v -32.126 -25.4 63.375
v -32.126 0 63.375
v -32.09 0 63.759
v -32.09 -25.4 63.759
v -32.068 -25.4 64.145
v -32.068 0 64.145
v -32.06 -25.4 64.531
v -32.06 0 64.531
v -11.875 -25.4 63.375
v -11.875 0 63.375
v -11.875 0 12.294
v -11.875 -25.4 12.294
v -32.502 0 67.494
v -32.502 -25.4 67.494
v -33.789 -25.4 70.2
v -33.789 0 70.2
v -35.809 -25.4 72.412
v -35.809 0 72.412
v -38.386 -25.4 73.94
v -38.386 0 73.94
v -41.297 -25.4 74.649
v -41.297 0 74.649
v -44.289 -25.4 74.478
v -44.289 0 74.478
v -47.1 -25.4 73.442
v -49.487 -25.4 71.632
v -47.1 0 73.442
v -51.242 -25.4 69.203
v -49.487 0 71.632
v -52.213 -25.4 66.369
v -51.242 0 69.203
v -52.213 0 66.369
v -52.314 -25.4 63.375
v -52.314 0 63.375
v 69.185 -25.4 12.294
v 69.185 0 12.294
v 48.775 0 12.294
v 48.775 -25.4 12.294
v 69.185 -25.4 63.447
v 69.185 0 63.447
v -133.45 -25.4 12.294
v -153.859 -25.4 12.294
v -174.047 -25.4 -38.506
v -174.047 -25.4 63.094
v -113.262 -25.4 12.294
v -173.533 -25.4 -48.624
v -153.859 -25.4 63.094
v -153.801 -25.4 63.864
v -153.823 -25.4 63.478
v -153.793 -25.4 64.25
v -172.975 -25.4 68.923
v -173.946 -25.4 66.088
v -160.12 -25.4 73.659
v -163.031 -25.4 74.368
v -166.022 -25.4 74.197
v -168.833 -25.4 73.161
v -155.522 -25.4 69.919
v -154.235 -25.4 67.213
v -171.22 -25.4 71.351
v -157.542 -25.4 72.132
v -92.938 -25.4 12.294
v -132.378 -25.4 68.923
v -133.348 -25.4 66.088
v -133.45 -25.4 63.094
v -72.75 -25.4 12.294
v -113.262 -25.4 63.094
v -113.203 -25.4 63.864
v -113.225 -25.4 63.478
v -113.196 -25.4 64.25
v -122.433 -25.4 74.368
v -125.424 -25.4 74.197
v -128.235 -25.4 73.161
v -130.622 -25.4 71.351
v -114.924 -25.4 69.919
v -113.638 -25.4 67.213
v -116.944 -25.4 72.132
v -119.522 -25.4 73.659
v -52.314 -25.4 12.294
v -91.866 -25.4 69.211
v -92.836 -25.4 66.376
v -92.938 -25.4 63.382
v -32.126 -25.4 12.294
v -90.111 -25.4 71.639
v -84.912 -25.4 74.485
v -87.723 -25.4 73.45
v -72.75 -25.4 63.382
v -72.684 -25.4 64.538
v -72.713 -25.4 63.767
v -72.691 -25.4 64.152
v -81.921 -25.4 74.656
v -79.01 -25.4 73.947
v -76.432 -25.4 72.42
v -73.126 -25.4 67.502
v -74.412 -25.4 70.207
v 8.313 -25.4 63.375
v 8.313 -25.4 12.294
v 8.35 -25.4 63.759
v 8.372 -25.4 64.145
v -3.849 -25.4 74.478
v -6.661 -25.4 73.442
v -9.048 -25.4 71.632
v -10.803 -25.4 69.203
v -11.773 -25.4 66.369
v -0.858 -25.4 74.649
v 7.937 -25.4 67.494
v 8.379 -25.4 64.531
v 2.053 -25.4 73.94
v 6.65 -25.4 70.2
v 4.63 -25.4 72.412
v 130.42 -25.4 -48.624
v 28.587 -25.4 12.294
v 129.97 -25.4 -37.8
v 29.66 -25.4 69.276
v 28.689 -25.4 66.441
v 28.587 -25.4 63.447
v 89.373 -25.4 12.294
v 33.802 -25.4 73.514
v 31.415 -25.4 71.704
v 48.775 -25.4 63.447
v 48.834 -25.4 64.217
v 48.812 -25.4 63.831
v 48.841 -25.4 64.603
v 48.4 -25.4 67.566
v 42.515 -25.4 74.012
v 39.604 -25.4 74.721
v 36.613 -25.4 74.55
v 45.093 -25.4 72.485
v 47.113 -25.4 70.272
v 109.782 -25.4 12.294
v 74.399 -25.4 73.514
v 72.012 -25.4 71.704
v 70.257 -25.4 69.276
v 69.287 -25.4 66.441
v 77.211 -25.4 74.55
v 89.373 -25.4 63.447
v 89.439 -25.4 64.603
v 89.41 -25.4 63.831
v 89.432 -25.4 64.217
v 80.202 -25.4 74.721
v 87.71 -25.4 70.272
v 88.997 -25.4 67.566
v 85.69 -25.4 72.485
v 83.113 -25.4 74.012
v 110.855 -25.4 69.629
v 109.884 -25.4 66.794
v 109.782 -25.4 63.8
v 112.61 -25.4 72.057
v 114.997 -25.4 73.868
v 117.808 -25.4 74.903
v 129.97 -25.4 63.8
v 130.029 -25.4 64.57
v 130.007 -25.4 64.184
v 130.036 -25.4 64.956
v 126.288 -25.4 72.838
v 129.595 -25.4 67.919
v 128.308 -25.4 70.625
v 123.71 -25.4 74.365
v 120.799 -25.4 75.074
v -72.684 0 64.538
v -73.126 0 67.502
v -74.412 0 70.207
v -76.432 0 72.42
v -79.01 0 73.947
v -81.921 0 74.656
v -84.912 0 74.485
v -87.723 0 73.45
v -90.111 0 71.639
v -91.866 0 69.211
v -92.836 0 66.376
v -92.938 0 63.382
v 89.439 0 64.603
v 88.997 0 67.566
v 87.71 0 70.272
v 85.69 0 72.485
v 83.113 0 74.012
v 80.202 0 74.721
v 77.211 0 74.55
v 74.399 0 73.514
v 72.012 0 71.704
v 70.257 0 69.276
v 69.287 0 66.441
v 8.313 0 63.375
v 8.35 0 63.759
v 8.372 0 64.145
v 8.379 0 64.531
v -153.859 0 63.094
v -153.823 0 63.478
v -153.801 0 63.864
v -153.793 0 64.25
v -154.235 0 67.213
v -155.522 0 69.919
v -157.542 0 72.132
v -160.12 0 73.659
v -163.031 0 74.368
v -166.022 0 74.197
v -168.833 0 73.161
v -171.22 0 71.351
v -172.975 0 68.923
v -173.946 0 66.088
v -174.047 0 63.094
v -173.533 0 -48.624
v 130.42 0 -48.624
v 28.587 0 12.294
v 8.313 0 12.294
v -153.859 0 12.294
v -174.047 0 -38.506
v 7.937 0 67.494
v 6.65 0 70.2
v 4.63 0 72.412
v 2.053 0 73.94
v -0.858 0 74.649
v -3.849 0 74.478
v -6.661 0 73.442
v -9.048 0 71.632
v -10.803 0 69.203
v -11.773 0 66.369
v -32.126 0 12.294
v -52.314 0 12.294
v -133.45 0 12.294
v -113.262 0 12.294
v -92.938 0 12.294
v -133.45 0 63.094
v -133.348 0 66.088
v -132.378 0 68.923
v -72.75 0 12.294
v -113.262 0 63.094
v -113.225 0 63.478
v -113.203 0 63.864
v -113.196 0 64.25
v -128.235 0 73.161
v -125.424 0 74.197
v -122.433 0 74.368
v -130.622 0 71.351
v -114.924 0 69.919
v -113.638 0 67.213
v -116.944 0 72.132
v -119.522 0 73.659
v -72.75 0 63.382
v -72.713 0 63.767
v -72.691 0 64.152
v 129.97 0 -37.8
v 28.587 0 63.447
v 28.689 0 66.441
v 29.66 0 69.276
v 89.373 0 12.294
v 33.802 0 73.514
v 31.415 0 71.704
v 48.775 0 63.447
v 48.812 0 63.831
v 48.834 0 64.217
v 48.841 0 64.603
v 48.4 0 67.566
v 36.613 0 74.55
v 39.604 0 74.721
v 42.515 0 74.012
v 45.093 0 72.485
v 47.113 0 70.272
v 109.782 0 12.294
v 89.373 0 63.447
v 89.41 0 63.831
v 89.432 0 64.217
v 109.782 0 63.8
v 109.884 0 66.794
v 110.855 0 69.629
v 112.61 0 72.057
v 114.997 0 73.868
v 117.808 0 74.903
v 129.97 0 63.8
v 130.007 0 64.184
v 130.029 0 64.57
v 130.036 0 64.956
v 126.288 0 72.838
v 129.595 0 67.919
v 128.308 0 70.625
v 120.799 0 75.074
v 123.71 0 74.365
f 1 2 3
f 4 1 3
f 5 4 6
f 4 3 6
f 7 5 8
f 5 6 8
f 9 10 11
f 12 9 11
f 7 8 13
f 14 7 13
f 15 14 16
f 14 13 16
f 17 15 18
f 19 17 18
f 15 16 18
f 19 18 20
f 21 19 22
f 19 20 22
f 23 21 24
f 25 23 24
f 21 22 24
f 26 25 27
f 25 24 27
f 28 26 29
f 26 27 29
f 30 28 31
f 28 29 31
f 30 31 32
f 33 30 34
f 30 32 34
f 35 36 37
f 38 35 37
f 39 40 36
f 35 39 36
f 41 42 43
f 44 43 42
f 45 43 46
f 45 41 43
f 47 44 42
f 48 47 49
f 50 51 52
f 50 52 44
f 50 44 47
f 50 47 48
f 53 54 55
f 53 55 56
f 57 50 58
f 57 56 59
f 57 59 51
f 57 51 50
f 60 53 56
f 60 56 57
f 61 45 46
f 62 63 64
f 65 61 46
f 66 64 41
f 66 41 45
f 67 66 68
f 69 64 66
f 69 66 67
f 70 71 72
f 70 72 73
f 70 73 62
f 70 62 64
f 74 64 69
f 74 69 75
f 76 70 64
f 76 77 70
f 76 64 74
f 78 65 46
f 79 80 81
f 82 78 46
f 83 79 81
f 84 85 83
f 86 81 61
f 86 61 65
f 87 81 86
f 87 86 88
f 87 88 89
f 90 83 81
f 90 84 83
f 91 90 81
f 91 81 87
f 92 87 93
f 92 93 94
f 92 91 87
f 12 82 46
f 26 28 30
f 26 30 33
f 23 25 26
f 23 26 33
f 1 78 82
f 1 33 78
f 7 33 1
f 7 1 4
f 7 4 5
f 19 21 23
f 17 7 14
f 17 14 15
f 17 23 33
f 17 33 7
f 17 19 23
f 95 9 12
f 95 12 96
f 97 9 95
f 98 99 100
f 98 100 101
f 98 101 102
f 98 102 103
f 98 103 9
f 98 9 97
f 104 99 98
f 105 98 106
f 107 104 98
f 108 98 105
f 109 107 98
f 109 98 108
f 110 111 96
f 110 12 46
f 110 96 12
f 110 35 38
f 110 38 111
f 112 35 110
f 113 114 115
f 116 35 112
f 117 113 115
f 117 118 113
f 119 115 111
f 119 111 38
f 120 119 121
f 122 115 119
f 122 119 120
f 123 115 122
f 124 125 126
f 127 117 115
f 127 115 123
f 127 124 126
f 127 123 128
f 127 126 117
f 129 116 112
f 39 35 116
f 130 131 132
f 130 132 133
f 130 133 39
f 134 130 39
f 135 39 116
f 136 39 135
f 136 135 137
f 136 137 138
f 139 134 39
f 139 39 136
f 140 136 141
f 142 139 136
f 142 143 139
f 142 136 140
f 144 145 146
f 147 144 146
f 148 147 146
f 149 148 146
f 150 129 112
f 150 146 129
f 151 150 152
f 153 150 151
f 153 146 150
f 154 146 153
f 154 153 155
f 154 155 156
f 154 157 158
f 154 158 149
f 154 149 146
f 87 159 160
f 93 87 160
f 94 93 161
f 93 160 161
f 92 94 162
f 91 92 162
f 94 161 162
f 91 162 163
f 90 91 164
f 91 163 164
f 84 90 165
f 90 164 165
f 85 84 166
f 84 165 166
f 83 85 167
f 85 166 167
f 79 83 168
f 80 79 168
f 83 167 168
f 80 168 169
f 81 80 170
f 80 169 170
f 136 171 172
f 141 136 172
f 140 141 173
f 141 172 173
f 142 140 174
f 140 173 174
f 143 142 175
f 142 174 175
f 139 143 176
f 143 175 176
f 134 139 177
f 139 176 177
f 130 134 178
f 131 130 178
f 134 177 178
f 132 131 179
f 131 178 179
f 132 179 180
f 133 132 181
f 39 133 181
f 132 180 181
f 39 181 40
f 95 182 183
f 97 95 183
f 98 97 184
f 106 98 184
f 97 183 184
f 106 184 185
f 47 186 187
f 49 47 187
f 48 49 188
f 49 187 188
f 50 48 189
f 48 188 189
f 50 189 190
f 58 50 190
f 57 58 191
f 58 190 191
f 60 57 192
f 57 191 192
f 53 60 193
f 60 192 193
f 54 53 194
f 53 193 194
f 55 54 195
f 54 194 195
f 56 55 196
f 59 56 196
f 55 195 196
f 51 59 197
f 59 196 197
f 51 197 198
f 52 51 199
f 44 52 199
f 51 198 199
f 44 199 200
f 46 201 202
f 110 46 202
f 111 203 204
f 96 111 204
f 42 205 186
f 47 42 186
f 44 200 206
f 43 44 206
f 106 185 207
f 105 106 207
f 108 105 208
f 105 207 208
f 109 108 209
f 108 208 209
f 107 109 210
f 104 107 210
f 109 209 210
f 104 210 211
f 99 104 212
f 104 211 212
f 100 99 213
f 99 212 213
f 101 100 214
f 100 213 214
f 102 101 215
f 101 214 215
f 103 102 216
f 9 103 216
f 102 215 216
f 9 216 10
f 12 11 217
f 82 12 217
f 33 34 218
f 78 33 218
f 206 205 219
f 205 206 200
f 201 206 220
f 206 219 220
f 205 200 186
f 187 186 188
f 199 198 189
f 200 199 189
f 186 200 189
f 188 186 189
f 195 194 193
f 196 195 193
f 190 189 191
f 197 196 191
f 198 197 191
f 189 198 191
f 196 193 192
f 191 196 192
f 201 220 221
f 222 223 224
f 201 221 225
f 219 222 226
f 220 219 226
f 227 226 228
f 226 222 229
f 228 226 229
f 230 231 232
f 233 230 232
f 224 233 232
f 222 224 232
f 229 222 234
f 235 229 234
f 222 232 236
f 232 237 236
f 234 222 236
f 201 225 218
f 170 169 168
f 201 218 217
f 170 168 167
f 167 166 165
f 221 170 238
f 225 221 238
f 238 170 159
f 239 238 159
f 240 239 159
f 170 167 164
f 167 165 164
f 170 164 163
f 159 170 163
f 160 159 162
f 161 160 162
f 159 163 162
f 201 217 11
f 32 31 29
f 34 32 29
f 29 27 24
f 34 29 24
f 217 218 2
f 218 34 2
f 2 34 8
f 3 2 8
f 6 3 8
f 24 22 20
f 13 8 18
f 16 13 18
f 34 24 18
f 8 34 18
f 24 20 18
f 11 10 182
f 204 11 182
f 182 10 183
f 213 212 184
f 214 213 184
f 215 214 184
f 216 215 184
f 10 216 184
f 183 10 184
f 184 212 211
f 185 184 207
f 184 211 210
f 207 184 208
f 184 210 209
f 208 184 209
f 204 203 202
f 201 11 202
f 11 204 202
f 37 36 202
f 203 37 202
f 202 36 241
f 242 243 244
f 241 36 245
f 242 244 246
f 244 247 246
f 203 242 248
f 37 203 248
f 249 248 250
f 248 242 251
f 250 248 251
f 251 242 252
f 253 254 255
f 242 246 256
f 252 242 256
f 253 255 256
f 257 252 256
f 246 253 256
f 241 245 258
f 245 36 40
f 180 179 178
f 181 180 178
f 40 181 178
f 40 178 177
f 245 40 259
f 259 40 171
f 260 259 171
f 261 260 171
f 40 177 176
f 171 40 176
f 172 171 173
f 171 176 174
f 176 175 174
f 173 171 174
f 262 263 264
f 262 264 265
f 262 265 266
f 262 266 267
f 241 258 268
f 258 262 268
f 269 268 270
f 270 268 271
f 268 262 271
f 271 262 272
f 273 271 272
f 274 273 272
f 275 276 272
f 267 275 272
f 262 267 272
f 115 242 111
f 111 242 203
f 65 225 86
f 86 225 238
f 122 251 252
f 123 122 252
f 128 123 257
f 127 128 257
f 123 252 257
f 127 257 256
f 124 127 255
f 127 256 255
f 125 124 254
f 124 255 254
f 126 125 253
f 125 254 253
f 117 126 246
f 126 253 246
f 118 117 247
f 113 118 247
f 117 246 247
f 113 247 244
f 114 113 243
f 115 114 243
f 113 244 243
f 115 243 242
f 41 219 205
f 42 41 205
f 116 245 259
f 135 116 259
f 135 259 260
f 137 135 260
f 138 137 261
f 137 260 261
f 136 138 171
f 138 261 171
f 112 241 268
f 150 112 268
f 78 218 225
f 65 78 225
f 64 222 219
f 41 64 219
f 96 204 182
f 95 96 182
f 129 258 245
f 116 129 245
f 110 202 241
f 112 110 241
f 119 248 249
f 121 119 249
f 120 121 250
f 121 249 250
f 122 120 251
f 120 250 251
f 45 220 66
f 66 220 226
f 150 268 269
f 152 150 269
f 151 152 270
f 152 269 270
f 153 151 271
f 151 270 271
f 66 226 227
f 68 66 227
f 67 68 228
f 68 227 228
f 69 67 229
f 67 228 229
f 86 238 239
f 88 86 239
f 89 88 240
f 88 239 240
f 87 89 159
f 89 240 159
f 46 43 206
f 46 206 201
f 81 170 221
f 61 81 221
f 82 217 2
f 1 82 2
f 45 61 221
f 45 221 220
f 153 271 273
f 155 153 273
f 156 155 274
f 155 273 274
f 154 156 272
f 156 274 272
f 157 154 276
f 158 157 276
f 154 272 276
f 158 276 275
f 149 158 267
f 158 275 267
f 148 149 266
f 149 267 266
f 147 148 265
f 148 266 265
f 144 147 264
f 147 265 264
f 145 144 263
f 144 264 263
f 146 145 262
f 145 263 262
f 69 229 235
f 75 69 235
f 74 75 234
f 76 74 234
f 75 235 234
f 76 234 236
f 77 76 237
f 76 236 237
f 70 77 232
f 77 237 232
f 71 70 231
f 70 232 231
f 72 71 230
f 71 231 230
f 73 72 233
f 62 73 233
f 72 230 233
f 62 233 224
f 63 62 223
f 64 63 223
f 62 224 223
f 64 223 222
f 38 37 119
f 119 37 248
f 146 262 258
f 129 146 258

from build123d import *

# Parameters (mm, degrees)
F1_DEPTH = 25.4


with BuildPart() as f1:
    # F0 (on Front) → F1 (new body)
    with BuildSketch(Plane.XZ):
        with BuildLine():
            ThreePointArc((-72.749855, 63.382049), (-72.700367, 63.959206), (-72.683854, 64.538244))
            ThreePointArc((-72.683854, 64.538244), (-83.422892, 74.681731), (-92.937852, 63.382049))
            ThreePointArc((-92.937852, 63.382049), (-82.843854, 54.378244), (-72.749855, 63.382049))
        make_face()
        with BuildLine():
            ThreePointArc((-72.749855, 63.382049), (-82.843854, 54.378244), (-92.937852, 63.382049))
            Line((-92.937852, 63.382049), (-92.937852, 12.293785))
            Line((-92.937852, 12.293785), (-72.749855, 12.293785))
            Line((-72.749855, 12.293785), (-72.749855, 63.382049))
        make_face()
        Polygon((-72.749855, 12.293785), (-92.937852, 12.293785), (-113.261852, 12.293785), (-133.44985, 12.293785), (-153.85941, 12.293785), (-174.047408, 12.293785), (-174.047408, -38.506215), (-173.53265, -48.624064), (-144.623931, -48.624064), (130.419544, -48.624064), (129.97048, -37.800175), (129.97048, 12.293785), (109.782483, 12.293785), (89.372952, 12.293785), (69.184954, 12.293785), (48.775379, 12.293785), (28.587381, 12.293785), (8.312916, 12.293785), (-11.875082, 12.293785), (-32.126242, 12.293785), (-52.314239, 12.293785), align=None)
        with BuildLine():
            Line((-133.44985, 12.293785), (-113.261852, 12.293785))
            Line((-113.261852, 12.293785), (-113.261852, 63.093788))
            ThreePointArc((-113.261852, 63.093788), (-123.355851, 54.089983), (-133.44985, 63.093788))
            Line((-133.44985, 63.093788), (-133.44985, 12.293785))
        make_face()
        with BuildLine():
            Line((-52.314239, 63.374581), (-52.314239, 12.293785))
            Line((-52.314239, 12.293785), (-32.126242, 12.293785))
            Line((-32.126242, 12.293785), (-32.126242, 63.374581))
            ThreePointArc((-32.126242, 63.374581), (-42.220241, 54.370776), (-52.314239, 63.374581))
        make_face()
        with BuildLine():
            ThreePointArc((-133.44985, 63.093788), (-123.355851, 54.089983), (-113.261852, 63.093788))
            ThreePointArc((-113.261852, 63.093788), (-113.212364, 63.670944), (-113.195851, 64.249983))
            ThreePointArc((-113.195851, 64.249983), (-123.934889, 74.393469), (-133.44985, 63.093788))
        make_face()
        with BuildLine():
            ThreePointArc((-32.060241, 64.530776), (-42.799279, 74.674262), (-52.314239, 63.374581))
            ThreePointArc((-52.314239, 63.374581), (-42.220241, 54.370776), (-32.126242, 63.374581))
            ThreePointArc((-32.126242, 63.374581), (-32.076754, 63.951737), (-32.060241, 64.530776))
        make_face()
        with BuildLine():
            Line((-174.047408, 12.293785), (-153.85941, 12.293785))
            Line((-153.85941, 12.293785), (-153.85941, 63.093785))
            ThreePointArc((-153.85941, 63.093785), (-163.953409, 54.08998), (-174.047408, 63.093785))
            Line((-174.047408, 63.093785), (-174.047408, 12.293785))
        make_face()
        with BuildLine():
            Line((-11.875082, 63.37458), (-11.875082, 12.293785))
            Line((-11.875082, 12.293785), (8.312916, 12.293785))
            Line((8.312916, 12.293785), (8.312916, 63.37458))
            ThreePointArc((8.312916, 63.37458), (-1.781083, 54.370775), (-11.875082, 63.37458))
        make_face()
        with BuildLine():
            ThreePointArc((-174.047408, 63.093785), (-163.953409, 54.08998), (-153.85941, 63.093785))
            ThreePointArc((-153.85941, 63.093785), (-153.809922, 63.670941), (-153.793409, 64.24998))
            ThreePointArc((-153.793409, 64.24998), (-164.532447, 74.393466), (-174.047408, 63.093785))
        make_face()
        with BuildLine():
            ThreePointArc((8.378917, 64.530775), (-2.360122, 74.674261), (-11.875082, 63.37458))
            ThreePointArc((-11.875082, 63.37458), (-1.781083, 54.370775), (8.312916, 63.37458))
            ThreePointArc((8.312916, 63.37458), (8.362403, 63.951736), (8.378917, 64.530775))
        make_face()
        with BuildLine():
            Line((28.587381, 63.446807), (28.587381, 12.293785))
            Line((28.587381, 12.293785), (48.775379, 12.293785))
            Line((48.775379, 12.293785), (48.775379, 63.446807))
            ThreePointArc((48.775379, 63.446807), (38.68138, 54.443002), (28.587381, 63.446807))
        make_face()
        with BuildLine():
            ThreePointArc((48.84138, 64.603002), (38.102342, 74.746488), (28.587381, 63.446807))
            ThreePointArc((28.587381, 63.446807), (38.68138, 54.443002), (48.775379, 63.446807))
            ThreePointArc((48.775379, 63.446807), (48.824867, 64.023963), (48.84138, 64.603002))
        make_face()
        with BuildLine():
            Line((69.184954, 63.446804), (69.184954, 12.293785))
            Line((69.184954, 12.293785), (89.372952, 12.293785))
            Line((89.372952, 12.293785), (89.372952, 63.446804))
            ThreePointArc((89.372952, 63.446804), (79.278953, 54.442999), (69.184954, 63.446804))
        make_face()
        with BuildLine():
            ThreePointArc((89.438953, 64.602999), (78.699915, 74.746485), (69.184954, 63.446804))
            ThreePointArc((69.184954, 63.446804), (79.278953, 54.442999), (89.372952, 63.446804))
            ThreePointArc((89.372952, 63.446804), (89.42244, 64.023961), (89.438953, 64.602999))
        make_face()
        with BuildLine():
            Line((109.782483, 63.799825), (109.782483, 12.293785))
            Line((109.782483, 12.293785), (129.97048, 12.293785))
            Line((129.97048, 12.293785), (129.97048, 63.799825))
            ThreePointArc((129.97048, 63.799825), (119.876481, 54.79602), (109.782483, 63.799825))
        make_face()
        with BuildLine():
            ThreePointArc((130.036481, 64.95602), (119.297443, 75.099506), (109.782483, 63.799825))
            ThreePointArc((109.782483, 63.799825), (119.876481, 54.79602), (129.97048, 63.799825))
            ThreePointArc((129.97048, 63.799825), (130.019968, 64.376981), (130.036481, 64.95602))
        make_face()
    extrude(amount=F1_DEPTH)


solid = f1.part
